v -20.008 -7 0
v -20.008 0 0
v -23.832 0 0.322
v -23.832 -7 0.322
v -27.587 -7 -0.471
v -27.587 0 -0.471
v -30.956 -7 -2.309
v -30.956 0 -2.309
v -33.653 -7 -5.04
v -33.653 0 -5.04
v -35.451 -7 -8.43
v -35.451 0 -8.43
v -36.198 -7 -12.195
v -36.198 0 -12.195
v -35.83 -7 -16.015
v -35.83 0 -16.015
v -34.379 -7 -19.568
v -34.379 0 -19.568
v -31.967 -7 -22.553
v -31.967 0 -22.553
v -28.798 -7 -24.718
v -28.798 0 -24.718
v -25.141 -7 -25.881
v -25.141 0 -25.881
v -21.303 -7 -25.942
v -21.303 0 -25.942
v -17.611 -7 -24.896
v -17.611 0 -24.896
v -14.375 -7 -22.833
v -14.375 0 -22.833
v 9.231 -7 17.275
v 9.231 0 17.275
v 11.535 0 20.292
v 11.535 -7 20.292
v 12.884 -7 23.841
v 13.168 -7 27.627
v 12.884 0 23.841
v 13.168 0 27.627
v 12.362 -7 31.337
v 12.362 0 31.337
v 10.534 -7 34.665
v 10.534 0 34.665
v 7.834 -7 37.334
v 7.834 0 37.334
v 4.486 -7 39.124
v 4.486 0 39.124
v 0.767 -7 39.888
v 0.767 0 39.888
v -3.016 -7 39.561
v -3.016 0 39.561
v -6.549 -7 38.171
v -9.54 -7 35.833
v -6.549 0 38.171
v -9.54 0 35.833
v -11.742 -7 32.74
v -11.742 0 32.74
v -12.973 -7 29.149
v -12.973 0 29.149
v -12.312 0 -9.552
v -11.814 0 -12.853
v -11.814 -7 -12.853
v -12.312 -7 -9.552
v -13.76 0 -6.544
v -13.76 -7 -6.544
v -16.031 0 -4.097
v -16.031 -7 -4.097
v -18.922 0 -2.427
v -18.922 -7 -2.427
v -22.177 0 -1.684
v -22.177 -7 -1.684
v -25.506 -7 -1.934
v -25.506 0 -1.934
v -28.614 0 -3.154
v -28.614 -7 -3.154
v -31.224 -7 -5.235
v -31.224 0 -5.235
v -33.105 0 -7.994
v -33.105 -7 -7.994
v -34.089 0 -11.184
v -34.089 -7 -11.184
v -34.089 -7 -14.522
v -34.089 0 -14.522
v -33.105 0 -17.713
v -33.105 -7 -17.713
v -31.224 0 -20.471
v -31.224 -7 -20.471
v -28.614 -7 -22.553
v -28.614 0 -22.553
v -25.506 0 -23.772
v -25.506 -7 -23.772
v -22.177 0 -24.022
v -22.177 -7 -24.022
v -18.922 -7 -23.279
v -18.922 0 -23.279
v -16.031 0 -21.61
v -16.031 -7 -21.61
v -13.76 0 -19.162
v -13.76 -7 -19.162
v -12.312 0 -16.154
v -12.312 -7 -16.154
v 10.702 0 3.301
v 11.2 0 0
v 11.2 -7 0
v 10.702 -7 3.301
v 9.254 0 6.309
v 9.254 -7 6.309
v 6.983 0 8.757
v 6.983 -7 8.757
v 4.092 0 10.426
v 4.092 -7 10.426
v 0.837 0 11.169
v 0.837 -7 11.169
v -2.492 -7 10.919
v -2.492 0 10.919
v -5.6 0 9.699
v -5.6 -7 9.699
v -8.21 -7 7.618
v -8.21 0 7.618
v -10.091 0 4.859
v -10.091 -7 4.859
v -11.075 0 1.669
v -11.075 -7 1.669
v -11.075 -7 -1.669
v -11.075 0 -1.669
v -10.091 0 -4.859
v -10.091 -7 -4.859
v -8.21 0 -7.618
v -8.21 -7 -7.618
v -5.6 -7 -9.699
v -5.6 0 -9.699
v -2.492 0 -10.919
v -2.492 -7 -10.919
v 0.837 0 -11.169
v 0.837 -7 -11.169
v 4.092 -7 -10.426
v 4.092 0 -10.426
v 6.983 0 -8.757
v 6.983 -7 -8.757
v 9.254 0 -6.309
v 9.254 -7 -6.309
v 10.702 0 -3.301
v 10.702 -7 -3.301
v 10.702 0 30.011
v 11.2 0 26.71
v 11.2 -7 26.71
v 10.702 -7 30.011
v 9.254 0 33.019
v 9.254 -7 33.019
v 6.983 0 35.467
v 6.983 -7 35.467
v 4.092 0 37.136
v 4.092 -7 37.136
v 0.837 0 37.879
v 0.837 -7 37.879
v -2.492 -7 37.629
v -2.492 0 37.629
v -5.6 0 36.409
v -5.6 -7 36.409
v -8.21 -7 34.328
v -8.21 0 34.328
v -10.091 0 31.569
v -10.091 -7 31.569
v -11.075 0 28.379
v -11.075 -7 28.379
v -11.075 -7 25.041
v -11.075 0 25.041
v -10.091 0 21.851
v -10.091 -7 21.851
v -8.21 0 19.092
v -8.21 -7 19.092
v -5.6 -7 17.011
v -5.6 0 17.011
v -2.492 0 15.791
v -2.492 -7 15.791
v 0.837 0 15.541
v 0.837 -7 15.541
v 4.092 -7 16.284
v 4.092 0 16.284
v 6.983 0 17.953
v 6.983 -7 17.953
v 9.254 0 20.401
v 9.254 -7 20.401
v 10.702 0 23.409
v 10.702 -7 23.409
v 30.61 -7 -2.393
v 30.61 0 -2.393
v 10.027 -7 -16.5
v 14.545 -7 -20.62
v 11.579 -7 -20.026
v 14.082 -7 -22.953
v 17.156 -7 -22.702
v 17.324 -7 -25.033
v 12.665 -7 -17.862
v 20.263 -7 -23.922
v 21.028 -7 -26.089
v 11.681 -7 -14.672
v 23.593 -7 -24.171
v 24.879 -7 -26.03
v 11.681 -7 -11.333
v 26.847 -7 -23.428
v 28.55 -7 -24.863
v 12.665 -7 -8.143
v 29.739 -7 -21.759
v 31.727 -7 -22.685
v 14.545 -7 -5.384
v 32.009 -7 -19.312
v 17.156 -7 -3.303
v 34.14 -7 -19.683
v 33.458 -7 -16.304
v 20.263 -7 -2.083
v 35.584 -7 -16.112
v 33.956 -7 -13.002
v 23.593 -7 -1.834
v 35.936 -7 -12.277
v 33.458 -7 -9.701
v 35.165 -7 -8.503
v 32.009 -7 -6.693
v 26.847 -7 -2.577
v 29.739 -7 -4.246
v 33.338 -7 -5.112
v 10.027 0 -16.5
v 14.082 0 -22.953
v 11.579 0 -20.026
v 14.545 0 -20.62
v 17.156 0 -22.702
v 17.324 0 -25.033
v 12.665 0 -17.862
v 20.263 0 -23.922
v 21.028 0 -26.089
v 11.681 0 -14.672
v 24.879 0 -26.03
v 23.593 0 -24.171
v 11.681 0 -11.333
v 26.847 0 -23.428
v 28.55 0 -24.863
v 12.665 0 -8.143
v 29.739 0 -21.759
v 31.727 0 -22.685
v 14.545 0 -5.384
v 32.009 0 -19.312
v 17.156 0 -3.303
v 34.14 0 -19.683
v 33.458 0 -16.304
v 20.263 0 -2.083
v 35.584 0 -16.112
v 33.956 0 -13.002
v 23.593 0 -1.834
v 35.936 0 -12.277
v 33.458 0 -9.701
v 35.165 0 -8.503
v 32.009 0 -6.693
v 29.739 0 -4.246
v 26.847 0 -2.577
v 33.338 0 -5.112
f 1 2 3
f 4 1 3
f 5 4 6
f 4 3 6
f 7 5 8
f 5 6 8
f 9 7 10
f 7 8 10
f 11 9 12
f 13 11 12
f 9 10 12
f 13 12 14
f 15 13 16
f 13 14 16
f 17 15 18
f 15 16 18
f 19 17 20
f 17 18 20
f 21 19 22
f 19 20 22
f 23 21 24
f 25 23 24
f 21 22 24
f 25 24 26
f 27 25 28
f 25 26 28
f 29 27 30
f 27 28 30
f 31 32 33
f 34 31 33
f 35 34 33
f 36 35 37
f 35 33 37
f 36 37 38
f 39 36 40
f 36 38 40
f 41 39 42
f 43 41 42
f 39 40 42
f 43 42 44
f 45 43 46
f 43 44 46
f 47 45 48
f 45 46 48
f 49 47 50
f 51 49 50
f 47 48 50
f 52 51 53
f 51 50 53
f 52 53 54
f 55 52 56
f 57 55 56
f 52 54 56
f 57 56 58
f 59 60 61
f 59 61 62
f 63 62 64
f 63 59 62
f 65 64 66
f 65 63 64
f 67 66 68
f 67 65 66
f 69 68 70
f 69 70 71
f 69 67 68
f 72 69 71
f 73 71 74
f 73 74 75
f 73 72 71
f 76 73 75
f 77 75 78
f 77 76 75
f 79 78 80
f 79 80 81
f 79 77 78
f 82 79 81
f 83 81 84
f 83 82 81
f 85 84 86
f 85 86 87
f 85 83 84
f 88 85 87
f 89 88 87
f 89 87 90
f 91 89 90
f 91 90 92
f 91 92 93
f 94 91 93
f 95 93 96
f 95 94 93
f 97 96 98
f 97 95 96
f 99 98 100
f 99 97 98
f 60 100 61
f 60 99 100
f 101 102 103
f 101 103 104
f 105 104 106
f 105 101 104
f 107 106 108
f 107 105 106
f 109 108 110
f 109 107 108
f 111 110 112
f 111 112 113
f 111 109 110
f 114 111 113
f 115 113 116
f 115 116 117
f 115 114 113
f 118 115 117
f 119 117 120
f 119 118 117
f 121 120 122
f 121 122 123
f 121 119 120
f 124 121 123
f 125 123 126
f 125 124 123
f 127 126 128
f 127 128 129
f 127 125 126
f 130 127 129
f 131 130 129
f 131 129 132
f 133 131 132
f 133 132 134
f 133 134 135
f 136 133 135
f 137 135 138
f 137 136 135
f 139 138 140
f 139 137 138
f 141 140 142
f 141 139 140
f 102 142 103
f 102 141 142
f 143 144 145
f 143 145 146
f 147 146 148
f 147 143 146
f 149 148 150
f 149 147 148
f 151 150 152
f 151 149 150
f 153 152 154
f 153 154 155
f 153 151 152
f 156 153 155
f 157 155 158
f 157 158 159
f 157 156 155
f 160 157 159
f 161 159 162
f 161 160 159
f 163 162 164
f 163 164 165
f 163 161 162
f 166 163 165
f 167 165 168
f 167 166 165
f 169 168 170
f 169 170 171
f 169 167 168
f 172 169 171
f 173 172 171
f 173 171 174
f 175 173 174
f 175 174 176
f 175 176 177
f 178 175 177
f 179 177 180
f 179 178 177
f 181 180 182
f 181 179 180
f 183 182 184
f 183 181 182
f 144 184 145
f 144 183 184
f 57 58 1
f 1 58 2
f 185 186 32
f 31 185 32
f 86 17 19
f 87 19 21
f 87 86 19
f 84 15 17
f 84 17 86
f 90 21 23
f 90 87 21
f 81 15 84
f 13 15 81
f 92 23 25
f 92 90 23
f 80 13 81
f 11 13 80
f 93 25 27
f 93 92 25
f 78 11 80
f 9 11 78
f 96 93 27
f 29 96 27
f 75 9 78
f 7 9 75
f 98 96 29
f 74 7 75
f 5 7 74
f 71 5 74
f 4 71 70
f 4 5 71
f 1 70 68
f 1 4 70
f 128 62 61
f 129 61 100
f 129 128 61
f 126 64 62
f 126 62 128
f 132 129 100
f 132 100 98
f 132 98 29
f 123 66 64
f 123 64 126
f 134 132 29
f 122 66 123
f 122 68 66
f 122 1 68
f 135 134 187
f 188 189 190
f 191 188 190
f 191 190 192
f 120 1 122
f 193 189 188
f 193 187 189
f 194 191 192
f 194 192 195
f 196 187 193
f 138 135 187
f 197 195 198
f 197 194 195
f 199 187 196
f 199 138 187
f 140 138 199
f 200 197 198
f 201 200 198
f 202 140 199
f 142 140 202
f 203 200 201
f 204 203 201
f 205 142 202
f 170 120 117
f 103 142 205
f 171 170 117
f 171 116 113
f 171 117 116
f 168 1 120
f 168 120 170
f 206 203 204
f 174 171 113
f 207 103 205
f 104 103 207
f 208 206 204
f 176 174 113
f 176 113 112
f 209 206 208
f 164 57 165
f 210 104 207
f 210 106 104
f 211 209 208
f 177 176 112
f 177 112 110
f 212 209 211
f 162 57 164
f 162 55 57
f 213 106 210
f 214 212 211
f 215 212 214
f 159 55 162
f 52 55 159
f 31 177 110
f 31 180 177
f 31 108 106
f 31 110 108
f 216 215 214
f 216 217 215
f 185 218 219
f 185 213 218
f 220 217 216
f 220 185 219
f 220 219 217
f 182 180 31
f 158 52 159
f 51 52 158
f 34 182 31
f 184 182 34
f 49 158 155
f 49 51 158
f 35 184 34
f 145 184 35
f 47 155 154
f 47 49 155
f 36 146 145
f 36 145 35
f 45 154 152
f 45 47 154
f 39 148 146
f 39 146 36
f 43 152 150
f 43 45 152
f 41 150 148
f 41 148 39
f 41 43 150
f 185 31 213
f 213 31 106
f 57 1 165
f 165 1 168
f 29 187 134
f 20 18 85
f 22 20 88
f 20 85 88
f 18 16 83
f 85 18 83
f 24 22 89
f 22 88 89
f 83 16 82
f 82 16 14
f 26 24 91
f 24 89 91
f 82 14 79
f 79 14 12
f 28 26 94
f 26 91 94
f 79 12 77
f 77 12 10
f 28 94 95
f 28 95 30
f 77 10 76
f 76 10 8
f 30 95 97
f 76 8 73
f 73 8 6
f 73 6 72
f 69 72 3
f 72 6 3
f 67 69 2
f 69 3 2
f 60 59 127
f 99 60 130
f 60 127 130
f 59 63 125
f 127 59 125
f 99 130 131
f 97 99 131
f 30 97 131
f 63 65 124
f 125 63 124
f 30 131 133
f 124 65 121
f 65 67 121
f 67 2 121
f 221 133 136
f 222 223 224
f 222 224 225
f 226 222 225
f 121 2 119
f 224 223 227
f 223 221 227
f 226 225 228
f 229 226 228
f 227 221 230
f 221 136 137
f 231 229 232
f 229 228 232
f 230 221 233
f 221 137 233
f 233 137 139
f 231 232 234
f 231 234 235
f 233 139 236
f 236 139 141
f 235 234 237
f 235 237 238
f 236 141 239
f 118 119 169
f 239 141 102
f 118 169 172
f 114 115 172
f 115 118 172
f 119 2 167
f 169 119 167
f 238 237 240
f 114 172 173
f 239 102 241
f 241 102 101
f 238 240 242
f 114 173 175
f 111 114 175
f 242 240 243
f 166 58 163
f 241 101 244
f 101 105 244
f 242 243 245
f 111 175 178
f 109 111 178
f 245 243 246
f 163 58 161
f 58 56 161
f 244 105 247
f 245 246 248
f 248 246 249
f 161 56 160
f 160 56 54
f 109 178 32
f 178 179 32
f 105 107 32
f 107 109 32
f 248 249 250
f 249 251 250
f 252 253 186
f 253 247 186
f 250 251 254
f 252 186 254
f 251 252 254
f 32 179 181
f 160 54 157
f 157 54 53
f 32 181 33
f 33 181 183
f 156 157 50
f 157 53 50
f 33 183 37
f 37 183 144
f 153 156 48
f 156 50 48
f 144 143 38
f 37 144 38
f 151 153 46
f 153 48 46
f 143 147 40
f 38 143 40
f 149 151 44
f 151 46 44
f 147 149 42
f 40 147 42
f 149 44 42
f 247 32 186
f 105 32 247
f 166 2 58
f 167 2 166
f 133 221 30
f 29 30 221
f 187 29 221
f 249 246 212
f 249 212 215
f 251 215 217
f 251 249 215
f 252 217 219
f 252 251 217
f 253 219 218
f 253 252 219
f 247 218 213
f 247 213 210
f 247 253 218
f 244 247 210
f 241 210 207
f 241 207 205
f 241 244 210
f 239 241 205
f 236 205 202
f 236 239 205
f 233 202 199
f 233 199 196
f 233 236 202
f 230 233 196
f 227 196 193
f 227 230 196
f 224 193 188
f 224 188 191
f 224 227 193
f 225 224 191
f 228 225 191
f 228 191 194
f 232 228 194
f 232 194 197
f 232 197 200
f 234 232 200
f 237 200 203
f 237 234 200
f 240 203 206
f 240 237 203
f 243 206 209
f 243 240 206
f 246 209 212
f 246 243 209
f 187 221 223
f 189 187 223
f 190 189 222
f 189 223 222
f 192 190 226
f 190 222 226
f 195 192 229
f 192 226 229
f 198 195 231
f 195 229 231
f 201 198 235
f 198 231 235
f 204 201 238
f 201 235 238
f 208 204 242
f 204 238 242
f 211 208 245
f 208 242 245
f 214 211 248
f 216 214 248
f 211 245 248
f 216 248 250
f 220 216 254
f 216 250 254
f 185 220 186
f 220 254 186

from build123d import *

# Parameters (mm, degrees)
F0_R     = 11.2
F1_DEPTH = 7


with BuildPart() as f1:
    # F0 (on Front) → F1 (new body)
    with BuildSketch(Plane.XZ):
        with BuildLine():
            Line((30.609758, -2.393342), (9.231073, 17.274573))
            ThreePointArc((9.231073, 17.274573), (6.224822, 38.350085), (-12.972782, 29.148631))
            Line((-12.972782, 29.148631), (-20.007871, 0))
            ThreePointArc((-20.007871, 0), (-35.829886, -16.014885), (-14.374704, -22.833085))
            Line((-14.374704, -22.833085), (10.027457, -16.50023))
            ThreePointArc((10.027457, -16.50023), (30.218147, -23.89046), (30.609758, -2.393342))
        make_face()
        with Locations((-23.014148, -12.853105)):
            Circle(F0_R, mode=Mode.SUBTRACT)
        with Locations((22.75558, -13.002389)):
            Circle(F0_R, mode=Mode.SUBTRACT)
        Circle(F0_R, mode=Mode.SUBTRACT)
        with Locations((0, 26.71)):
            Circle(F0_R, mode=Mode.SUBTRACT)
    extrude(amount=F1_DEPTH)


solid = f1.part
